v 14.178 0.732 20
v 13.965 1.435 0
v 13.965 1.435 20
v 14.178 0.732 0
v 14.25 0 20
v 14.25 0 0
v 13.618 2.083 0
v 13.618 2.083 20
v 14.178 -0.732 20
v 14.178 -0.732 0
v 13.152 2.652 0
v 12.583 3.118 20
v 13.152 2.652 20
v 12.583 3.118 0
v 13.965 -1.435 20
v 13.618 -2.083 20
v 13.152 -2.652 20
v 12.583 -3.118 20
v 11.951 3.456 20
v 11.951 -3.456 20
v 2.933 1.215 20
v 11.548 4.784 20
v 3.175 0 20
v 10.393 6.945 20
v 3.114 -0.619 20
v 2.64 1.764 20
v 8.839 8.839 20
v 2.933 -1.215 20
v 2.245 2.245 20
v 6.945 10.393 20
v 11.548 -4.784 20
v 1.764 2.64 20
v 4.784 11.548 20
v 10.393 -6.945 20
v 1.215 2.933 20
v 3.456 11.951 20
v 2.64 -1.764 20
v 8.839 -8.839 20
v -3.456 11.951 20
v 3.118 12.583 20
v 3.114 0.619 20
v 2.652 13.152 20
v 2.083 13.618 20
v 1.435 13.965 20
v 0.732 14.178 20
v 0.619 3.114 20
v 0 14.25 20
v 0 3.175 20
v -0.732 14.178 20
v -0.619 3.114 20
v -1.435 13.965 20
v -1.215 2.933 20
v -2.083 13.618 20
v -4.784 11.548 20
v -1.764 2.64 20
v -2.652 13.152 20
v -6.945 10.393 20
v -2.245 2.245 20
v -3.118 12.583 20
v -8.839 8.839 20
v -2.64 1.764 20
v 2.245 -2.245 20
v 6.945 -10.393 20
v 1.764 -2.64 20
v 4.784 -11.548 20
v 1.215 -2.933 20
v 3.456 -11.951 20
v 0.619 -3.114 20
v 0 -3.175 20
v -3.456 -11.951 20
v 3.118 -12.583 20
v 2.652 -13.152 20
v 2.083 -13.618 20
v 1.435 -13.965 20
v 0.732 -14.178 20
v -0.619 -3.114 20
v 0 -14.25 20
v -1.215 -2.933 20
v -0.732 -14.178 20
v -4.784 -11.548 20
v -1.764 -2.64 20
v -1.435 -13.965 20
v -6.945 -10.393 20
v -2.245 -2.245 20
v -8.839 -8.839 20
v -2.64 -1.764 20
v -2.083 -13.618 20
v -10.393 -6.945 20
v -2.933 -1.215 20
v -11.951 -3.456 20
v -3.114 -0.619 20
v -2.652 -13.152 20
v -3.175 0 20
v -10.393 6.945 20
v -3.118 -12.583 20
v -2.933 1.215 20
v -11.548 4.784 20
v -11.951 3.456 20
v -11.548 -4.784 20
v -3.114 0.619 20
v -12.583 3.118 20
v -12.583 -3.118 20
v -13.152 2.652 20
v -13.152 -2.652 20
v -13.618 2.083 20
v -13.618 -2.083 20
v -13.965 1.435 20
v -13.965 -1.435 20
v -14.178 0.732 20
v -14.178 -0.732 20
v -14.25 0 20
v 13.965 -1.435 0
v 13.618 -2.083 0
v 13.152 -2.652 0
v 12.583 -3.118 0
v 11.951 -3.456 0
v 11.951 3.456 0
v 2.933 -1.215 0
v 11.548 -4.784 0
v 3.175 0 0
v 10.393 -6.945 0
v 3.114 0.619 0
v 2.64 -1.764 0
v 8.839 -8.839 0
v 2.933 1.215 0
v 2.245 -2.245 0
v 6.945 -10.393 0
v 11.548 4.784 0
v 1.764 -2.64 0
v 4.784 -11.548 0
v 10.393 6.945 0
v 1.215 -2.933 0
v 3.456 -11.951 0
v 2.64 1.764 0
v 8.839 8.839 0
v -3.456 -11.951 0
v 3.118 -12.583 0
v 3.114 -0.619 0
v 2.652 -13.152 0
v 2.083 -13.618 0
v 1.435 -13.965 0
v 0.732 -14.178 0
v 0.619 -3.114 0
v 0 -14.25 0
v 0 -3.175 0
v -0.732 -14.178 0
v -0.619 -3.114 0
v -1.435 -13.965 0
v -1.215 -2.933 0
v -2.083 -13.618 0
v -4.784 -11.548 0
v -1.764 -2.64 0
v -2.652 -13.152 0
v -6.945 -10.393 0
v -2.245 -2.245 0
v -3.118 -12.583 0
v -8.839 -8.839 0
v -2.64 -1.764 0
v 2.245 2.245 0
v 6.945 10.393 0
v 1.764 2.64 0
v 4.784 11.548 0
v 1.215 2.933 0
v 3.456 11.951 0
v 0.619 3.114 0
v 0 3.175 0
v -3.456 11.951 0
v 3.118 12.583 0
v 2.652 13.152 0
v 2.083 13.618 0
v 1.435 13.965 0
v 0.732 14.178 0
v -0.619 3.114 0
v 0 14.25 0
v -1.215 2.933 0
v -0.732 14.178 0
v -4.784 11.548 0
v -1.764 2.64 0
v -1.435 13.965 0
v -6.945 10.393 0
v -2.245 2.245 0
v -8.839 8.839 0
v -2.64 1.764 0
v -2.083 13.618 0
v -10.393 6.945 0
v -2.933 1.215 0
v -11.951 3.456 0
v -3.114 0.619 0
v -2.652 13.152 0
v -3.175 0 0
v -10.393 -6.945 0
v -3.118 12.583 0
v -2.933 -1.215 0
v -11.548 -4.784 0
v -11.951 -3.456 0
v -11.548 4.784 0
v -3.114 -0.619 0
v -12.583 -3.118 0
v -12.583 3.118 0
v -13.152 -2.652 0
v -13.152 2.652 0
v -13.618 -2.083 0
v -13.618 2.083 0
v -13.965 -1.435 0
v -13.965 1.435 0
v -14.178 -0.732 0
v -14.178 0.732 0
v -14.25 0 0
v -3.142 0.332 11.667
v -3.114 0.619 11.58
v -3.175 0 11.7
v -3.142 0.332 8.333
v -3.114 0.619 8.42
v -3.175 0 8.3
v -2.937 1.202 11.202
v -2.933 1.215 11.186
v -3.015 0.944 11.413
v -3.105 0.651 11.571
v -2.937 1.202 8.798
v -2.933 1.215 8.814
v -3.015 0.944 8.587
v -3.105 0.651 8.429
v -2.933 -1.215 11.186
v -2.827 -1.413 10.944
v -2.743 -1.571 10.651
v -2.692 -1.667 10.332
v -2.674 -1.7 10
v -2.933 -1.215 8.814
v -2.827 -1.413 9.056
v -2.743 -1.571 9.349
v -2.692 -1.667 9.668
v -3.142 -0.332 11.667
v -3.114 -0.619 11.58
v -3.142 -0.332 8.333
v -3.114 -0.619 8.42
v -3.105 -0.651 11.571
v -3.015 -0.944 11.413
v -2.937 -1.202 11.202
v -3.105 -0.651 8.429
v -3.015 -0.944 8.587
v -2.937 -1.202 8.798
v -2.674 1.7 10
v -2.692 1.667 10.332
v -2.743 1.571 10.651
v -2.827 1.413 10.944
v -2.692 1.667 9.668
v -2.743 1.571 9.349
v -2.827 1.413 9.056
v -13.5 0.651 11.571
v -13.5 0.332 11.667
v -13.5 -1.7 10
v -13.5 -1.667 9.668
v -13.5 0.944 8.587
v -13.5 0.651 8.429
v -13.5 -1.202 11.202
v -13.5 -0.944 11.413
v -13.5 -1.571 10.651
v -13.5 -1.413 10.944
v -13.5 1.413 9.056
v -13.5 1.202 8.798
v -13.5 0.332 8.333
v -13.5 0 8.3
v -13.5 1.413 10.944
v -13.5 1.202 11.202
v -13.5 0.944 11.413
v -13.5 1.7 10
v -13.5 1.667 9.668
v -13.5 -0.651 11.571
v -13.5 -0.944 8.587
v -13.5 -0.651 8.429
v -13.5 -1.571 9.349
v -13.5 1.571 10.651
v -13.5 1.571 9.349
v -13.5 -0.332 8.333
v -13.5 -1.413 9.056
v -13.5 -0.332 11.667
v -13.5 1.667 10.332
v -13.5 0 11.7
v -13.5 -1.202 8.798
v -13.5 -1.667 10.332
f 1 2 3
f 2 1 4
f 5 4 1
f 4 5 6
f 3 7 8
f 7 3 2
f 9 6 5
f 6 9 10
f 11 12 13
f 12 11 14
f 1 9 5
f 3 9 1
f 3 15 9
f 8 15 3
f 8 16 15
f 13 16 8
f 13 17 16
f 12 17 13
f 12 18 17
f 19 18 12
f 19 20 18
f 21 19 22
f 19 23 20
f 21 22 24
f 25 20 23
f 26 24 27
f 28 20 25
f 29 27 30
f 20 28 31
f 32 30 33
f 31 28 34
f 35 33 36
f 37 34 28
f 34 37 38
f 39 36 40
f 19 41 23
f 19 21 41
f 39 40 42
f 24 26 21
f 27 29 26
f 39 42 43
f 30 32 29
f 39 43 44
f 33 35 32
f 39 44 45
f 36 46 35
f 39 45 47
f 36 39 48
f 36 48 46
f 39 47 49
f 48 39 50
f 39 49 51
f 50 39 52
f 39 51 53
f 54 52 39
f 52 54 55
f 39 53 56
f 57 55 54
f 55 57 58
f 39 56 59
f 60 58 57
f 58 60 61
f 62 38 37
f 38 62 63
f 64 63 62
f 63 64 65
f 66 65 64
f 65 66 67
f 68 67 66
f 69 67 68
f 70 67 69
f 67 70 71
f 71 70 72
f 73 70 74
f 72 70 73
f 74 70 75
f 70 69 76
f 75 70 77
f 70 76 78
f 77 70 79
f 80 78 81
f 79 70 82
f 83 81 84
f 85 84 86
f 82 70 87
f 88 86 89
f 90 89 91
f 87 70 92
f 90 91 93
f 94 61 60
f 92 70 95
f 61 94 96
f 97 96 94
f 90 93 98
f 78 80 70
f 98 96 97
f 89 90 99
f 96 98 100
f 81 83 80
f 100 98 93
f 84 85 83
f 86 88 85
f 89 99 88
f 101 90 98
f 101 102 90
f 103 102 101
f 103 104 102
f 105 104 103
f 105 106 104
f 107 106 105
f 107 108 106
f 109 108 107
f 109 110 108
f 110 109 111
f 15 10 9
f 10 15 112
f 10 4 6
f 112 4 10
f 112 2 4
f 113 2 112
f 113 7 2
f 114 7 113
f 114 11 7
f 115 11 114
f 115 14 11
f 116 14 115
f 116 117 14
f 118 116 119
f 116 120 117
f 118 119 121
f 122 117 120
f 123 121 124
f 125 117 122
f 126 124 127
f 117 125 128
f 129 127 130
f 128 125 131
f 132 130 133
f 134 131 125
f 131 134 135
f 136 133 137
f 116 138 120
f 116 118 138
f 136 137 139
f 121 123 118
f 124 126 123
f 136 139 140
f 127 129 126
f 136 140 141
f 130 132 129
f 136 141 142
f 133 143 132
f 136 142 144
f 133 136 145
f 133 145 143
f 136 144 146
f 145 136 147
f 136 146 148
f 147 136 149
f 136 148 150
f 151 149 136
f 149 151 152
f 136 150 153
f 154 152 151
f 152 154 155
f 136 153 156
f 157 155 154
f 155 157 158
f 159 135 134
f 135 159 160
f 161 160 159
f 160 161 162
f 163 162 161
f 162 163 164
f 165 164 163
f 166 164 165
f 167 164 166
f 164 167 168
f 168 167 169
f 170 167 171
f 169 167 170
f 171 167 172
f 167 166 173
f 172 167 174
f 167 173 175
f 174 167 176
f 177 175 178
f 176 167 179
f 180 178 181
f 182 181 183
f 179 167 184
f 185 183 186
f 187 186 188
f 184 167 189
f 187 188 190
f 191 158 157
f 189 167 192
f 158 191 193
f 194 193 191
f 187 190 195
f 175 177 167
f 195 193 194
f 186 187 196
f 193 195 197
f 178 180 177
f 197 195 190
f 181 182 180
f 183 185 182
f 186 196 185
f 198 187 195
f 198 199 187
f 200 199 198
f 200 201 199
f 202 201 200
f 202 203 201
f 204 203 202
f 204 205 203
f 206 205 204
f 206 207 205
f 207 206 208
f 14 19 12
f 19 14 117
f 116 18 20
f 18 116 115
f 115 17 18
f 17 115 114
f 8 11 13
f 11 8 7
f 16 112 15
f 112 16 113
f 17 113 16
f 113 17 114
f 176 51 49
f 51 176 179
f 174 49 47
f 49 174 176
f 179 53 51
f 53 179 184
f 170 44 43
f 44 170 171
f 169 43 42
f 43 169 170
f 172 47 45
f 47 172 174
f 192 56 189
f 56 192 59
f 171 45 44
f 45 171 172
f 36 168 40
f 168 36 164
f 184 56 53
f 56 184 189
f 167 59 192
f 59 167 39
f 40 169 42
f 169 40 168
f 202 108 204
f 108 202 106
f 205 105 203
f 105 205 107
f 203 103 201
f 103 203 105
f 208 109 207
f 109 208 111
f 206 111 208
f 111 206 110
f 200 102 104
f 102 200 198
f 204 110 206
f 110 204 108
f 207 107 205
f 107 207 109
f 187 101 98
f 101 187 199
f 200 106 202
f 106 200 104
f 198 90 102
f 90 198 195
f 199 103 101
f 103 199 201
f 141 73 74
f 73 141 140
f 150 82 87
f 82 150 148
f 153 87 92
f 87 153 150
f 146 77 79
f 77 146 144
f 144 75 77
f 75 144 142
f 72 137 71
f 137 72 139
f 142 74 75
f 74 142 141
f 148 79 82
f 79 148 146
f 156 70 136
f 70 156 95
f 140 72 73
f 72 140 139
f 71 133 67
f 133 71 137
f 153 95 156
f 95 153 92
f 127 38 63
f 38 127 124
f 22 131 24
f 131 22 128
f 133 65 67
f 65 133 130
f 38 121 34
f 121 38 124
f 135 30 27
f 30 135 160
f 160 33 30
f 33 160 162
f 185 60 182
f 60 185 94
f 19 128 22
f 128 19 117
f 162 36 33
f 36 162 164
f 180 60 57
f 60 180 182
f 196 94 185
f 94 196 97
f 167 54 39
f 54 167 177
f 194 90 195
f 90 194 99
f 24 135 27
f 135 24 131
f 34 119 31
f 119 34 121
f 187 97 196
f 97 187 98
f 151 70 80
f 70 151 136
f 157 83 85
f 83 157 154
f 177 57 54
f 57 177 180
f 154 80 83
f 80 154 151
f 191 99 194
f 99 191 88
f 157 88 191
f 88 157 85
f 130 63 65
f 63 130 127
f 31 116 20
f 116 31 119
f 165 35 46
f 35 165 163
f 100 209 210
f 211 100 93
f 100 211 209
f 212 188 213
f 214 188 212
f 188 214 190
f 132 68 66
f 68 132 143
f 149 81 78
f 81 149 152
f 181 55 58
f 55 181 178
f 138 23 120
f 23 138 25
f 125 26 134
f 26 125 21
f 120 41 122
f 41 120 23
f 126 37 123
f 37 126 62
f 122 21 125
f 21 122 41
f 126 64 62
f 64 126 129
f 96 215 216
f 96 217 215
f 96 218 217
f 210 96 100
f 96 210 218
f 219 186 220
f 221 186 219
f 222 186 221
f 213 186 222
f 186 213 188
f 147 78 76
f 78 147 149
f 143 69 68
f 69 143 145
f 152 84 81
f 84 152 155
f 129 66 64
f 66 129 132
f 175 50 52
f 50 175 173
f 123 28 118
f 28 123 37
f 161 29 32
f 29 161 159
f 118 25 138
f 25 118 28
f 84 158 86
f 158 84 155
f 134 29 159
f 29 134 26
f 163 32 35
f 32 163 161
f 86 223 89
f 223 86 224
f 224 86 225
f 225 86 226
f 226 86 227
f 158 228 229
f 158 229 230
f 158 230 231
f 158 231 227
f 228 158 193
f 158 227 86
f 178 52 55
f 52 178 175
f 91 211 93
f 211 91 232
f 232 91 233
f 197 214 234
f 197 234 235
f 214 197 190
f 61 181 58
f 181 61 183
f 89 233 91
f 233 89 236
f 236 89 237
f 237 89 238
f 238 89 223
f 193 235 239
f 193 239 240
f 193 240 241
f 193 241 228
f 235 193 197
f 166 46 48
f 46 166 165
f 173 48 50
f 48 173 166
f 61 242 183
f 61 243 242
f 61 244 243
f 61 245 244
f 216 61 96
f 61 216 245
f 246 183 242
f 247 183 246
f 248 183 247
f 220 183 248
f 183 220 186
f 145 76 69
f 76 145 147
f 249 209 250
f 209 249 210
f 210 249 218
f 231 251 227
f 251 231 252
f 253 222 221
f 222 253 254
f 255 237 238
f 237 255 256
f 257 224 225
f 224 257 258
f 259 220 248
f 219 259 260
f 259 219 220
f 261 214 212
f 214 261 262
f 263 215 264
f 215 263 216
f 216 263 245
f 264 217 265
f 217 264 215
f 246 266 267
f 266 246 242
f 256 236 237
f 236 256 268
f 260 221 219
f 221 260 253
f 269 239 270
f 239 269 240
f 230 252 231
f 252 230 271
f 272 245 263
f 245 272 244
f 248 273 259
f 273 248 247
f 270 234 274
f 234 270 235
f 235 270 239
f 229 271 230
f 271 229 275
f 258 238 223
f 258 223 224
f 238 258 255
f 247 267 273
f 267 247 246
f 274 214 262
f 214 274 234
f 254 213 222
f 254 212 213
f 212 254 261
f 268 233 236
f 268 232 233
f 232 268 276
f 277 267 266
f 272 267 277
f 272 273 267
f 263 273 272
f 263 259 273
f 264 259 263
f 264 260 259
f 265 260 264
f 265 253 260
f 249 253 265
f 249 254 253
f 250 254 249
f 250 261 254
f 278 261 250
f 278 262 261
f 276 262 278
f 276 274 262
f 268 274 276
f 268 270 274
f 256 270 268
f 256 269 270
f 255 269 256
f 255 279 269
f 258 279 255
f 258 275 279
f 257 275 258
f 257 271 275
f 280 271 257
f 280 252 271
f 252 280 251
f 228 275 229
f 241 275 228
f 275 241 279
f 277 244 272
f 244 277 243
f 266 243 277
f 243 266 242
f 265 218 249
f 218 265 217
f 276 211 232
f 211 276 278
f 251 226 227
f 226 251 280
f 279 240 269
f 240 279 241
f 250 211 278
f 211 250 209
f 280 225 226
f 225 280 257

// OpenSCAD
$fn = 32;

// ----------------------------------------------------------------------
// Hand knob: 25 x 25 x 20 mm
// ----------------------------------------------------------------------

// --- parameters (mm) ---
knob_d = 25;              // knob diameter
knob_h = 20;              // knob height
bore_d = 6.35;            // shaft bore
set_d = 3.4;              // set screw tap hole
knurl_d = 1.46;           // knurl groove diameter
lobes = 4;                // grip lobes

module body() {
  cylinder(h = knob_h, d = knob_d);
  for (i = [0 : lobes - 1])
    rotate([0, 0, i * 360 / lobes])
      translate([knob_d * 0.42, 0, 0])
        cylinder(h = knob_h, d = knob_d * 0.3);
}

difference() {
  union() {
    body();
  }
  translate([0, 0, -1]) cylinder(h = knob_h + 0 + 2, d = bore_d);
  translate([-knob_d / 2 - 1, 0, knob_h * 0.5]) rotate([0, 90, 0]) cylinder(h = knob_d / 2 + 2, d = set_d);
}
